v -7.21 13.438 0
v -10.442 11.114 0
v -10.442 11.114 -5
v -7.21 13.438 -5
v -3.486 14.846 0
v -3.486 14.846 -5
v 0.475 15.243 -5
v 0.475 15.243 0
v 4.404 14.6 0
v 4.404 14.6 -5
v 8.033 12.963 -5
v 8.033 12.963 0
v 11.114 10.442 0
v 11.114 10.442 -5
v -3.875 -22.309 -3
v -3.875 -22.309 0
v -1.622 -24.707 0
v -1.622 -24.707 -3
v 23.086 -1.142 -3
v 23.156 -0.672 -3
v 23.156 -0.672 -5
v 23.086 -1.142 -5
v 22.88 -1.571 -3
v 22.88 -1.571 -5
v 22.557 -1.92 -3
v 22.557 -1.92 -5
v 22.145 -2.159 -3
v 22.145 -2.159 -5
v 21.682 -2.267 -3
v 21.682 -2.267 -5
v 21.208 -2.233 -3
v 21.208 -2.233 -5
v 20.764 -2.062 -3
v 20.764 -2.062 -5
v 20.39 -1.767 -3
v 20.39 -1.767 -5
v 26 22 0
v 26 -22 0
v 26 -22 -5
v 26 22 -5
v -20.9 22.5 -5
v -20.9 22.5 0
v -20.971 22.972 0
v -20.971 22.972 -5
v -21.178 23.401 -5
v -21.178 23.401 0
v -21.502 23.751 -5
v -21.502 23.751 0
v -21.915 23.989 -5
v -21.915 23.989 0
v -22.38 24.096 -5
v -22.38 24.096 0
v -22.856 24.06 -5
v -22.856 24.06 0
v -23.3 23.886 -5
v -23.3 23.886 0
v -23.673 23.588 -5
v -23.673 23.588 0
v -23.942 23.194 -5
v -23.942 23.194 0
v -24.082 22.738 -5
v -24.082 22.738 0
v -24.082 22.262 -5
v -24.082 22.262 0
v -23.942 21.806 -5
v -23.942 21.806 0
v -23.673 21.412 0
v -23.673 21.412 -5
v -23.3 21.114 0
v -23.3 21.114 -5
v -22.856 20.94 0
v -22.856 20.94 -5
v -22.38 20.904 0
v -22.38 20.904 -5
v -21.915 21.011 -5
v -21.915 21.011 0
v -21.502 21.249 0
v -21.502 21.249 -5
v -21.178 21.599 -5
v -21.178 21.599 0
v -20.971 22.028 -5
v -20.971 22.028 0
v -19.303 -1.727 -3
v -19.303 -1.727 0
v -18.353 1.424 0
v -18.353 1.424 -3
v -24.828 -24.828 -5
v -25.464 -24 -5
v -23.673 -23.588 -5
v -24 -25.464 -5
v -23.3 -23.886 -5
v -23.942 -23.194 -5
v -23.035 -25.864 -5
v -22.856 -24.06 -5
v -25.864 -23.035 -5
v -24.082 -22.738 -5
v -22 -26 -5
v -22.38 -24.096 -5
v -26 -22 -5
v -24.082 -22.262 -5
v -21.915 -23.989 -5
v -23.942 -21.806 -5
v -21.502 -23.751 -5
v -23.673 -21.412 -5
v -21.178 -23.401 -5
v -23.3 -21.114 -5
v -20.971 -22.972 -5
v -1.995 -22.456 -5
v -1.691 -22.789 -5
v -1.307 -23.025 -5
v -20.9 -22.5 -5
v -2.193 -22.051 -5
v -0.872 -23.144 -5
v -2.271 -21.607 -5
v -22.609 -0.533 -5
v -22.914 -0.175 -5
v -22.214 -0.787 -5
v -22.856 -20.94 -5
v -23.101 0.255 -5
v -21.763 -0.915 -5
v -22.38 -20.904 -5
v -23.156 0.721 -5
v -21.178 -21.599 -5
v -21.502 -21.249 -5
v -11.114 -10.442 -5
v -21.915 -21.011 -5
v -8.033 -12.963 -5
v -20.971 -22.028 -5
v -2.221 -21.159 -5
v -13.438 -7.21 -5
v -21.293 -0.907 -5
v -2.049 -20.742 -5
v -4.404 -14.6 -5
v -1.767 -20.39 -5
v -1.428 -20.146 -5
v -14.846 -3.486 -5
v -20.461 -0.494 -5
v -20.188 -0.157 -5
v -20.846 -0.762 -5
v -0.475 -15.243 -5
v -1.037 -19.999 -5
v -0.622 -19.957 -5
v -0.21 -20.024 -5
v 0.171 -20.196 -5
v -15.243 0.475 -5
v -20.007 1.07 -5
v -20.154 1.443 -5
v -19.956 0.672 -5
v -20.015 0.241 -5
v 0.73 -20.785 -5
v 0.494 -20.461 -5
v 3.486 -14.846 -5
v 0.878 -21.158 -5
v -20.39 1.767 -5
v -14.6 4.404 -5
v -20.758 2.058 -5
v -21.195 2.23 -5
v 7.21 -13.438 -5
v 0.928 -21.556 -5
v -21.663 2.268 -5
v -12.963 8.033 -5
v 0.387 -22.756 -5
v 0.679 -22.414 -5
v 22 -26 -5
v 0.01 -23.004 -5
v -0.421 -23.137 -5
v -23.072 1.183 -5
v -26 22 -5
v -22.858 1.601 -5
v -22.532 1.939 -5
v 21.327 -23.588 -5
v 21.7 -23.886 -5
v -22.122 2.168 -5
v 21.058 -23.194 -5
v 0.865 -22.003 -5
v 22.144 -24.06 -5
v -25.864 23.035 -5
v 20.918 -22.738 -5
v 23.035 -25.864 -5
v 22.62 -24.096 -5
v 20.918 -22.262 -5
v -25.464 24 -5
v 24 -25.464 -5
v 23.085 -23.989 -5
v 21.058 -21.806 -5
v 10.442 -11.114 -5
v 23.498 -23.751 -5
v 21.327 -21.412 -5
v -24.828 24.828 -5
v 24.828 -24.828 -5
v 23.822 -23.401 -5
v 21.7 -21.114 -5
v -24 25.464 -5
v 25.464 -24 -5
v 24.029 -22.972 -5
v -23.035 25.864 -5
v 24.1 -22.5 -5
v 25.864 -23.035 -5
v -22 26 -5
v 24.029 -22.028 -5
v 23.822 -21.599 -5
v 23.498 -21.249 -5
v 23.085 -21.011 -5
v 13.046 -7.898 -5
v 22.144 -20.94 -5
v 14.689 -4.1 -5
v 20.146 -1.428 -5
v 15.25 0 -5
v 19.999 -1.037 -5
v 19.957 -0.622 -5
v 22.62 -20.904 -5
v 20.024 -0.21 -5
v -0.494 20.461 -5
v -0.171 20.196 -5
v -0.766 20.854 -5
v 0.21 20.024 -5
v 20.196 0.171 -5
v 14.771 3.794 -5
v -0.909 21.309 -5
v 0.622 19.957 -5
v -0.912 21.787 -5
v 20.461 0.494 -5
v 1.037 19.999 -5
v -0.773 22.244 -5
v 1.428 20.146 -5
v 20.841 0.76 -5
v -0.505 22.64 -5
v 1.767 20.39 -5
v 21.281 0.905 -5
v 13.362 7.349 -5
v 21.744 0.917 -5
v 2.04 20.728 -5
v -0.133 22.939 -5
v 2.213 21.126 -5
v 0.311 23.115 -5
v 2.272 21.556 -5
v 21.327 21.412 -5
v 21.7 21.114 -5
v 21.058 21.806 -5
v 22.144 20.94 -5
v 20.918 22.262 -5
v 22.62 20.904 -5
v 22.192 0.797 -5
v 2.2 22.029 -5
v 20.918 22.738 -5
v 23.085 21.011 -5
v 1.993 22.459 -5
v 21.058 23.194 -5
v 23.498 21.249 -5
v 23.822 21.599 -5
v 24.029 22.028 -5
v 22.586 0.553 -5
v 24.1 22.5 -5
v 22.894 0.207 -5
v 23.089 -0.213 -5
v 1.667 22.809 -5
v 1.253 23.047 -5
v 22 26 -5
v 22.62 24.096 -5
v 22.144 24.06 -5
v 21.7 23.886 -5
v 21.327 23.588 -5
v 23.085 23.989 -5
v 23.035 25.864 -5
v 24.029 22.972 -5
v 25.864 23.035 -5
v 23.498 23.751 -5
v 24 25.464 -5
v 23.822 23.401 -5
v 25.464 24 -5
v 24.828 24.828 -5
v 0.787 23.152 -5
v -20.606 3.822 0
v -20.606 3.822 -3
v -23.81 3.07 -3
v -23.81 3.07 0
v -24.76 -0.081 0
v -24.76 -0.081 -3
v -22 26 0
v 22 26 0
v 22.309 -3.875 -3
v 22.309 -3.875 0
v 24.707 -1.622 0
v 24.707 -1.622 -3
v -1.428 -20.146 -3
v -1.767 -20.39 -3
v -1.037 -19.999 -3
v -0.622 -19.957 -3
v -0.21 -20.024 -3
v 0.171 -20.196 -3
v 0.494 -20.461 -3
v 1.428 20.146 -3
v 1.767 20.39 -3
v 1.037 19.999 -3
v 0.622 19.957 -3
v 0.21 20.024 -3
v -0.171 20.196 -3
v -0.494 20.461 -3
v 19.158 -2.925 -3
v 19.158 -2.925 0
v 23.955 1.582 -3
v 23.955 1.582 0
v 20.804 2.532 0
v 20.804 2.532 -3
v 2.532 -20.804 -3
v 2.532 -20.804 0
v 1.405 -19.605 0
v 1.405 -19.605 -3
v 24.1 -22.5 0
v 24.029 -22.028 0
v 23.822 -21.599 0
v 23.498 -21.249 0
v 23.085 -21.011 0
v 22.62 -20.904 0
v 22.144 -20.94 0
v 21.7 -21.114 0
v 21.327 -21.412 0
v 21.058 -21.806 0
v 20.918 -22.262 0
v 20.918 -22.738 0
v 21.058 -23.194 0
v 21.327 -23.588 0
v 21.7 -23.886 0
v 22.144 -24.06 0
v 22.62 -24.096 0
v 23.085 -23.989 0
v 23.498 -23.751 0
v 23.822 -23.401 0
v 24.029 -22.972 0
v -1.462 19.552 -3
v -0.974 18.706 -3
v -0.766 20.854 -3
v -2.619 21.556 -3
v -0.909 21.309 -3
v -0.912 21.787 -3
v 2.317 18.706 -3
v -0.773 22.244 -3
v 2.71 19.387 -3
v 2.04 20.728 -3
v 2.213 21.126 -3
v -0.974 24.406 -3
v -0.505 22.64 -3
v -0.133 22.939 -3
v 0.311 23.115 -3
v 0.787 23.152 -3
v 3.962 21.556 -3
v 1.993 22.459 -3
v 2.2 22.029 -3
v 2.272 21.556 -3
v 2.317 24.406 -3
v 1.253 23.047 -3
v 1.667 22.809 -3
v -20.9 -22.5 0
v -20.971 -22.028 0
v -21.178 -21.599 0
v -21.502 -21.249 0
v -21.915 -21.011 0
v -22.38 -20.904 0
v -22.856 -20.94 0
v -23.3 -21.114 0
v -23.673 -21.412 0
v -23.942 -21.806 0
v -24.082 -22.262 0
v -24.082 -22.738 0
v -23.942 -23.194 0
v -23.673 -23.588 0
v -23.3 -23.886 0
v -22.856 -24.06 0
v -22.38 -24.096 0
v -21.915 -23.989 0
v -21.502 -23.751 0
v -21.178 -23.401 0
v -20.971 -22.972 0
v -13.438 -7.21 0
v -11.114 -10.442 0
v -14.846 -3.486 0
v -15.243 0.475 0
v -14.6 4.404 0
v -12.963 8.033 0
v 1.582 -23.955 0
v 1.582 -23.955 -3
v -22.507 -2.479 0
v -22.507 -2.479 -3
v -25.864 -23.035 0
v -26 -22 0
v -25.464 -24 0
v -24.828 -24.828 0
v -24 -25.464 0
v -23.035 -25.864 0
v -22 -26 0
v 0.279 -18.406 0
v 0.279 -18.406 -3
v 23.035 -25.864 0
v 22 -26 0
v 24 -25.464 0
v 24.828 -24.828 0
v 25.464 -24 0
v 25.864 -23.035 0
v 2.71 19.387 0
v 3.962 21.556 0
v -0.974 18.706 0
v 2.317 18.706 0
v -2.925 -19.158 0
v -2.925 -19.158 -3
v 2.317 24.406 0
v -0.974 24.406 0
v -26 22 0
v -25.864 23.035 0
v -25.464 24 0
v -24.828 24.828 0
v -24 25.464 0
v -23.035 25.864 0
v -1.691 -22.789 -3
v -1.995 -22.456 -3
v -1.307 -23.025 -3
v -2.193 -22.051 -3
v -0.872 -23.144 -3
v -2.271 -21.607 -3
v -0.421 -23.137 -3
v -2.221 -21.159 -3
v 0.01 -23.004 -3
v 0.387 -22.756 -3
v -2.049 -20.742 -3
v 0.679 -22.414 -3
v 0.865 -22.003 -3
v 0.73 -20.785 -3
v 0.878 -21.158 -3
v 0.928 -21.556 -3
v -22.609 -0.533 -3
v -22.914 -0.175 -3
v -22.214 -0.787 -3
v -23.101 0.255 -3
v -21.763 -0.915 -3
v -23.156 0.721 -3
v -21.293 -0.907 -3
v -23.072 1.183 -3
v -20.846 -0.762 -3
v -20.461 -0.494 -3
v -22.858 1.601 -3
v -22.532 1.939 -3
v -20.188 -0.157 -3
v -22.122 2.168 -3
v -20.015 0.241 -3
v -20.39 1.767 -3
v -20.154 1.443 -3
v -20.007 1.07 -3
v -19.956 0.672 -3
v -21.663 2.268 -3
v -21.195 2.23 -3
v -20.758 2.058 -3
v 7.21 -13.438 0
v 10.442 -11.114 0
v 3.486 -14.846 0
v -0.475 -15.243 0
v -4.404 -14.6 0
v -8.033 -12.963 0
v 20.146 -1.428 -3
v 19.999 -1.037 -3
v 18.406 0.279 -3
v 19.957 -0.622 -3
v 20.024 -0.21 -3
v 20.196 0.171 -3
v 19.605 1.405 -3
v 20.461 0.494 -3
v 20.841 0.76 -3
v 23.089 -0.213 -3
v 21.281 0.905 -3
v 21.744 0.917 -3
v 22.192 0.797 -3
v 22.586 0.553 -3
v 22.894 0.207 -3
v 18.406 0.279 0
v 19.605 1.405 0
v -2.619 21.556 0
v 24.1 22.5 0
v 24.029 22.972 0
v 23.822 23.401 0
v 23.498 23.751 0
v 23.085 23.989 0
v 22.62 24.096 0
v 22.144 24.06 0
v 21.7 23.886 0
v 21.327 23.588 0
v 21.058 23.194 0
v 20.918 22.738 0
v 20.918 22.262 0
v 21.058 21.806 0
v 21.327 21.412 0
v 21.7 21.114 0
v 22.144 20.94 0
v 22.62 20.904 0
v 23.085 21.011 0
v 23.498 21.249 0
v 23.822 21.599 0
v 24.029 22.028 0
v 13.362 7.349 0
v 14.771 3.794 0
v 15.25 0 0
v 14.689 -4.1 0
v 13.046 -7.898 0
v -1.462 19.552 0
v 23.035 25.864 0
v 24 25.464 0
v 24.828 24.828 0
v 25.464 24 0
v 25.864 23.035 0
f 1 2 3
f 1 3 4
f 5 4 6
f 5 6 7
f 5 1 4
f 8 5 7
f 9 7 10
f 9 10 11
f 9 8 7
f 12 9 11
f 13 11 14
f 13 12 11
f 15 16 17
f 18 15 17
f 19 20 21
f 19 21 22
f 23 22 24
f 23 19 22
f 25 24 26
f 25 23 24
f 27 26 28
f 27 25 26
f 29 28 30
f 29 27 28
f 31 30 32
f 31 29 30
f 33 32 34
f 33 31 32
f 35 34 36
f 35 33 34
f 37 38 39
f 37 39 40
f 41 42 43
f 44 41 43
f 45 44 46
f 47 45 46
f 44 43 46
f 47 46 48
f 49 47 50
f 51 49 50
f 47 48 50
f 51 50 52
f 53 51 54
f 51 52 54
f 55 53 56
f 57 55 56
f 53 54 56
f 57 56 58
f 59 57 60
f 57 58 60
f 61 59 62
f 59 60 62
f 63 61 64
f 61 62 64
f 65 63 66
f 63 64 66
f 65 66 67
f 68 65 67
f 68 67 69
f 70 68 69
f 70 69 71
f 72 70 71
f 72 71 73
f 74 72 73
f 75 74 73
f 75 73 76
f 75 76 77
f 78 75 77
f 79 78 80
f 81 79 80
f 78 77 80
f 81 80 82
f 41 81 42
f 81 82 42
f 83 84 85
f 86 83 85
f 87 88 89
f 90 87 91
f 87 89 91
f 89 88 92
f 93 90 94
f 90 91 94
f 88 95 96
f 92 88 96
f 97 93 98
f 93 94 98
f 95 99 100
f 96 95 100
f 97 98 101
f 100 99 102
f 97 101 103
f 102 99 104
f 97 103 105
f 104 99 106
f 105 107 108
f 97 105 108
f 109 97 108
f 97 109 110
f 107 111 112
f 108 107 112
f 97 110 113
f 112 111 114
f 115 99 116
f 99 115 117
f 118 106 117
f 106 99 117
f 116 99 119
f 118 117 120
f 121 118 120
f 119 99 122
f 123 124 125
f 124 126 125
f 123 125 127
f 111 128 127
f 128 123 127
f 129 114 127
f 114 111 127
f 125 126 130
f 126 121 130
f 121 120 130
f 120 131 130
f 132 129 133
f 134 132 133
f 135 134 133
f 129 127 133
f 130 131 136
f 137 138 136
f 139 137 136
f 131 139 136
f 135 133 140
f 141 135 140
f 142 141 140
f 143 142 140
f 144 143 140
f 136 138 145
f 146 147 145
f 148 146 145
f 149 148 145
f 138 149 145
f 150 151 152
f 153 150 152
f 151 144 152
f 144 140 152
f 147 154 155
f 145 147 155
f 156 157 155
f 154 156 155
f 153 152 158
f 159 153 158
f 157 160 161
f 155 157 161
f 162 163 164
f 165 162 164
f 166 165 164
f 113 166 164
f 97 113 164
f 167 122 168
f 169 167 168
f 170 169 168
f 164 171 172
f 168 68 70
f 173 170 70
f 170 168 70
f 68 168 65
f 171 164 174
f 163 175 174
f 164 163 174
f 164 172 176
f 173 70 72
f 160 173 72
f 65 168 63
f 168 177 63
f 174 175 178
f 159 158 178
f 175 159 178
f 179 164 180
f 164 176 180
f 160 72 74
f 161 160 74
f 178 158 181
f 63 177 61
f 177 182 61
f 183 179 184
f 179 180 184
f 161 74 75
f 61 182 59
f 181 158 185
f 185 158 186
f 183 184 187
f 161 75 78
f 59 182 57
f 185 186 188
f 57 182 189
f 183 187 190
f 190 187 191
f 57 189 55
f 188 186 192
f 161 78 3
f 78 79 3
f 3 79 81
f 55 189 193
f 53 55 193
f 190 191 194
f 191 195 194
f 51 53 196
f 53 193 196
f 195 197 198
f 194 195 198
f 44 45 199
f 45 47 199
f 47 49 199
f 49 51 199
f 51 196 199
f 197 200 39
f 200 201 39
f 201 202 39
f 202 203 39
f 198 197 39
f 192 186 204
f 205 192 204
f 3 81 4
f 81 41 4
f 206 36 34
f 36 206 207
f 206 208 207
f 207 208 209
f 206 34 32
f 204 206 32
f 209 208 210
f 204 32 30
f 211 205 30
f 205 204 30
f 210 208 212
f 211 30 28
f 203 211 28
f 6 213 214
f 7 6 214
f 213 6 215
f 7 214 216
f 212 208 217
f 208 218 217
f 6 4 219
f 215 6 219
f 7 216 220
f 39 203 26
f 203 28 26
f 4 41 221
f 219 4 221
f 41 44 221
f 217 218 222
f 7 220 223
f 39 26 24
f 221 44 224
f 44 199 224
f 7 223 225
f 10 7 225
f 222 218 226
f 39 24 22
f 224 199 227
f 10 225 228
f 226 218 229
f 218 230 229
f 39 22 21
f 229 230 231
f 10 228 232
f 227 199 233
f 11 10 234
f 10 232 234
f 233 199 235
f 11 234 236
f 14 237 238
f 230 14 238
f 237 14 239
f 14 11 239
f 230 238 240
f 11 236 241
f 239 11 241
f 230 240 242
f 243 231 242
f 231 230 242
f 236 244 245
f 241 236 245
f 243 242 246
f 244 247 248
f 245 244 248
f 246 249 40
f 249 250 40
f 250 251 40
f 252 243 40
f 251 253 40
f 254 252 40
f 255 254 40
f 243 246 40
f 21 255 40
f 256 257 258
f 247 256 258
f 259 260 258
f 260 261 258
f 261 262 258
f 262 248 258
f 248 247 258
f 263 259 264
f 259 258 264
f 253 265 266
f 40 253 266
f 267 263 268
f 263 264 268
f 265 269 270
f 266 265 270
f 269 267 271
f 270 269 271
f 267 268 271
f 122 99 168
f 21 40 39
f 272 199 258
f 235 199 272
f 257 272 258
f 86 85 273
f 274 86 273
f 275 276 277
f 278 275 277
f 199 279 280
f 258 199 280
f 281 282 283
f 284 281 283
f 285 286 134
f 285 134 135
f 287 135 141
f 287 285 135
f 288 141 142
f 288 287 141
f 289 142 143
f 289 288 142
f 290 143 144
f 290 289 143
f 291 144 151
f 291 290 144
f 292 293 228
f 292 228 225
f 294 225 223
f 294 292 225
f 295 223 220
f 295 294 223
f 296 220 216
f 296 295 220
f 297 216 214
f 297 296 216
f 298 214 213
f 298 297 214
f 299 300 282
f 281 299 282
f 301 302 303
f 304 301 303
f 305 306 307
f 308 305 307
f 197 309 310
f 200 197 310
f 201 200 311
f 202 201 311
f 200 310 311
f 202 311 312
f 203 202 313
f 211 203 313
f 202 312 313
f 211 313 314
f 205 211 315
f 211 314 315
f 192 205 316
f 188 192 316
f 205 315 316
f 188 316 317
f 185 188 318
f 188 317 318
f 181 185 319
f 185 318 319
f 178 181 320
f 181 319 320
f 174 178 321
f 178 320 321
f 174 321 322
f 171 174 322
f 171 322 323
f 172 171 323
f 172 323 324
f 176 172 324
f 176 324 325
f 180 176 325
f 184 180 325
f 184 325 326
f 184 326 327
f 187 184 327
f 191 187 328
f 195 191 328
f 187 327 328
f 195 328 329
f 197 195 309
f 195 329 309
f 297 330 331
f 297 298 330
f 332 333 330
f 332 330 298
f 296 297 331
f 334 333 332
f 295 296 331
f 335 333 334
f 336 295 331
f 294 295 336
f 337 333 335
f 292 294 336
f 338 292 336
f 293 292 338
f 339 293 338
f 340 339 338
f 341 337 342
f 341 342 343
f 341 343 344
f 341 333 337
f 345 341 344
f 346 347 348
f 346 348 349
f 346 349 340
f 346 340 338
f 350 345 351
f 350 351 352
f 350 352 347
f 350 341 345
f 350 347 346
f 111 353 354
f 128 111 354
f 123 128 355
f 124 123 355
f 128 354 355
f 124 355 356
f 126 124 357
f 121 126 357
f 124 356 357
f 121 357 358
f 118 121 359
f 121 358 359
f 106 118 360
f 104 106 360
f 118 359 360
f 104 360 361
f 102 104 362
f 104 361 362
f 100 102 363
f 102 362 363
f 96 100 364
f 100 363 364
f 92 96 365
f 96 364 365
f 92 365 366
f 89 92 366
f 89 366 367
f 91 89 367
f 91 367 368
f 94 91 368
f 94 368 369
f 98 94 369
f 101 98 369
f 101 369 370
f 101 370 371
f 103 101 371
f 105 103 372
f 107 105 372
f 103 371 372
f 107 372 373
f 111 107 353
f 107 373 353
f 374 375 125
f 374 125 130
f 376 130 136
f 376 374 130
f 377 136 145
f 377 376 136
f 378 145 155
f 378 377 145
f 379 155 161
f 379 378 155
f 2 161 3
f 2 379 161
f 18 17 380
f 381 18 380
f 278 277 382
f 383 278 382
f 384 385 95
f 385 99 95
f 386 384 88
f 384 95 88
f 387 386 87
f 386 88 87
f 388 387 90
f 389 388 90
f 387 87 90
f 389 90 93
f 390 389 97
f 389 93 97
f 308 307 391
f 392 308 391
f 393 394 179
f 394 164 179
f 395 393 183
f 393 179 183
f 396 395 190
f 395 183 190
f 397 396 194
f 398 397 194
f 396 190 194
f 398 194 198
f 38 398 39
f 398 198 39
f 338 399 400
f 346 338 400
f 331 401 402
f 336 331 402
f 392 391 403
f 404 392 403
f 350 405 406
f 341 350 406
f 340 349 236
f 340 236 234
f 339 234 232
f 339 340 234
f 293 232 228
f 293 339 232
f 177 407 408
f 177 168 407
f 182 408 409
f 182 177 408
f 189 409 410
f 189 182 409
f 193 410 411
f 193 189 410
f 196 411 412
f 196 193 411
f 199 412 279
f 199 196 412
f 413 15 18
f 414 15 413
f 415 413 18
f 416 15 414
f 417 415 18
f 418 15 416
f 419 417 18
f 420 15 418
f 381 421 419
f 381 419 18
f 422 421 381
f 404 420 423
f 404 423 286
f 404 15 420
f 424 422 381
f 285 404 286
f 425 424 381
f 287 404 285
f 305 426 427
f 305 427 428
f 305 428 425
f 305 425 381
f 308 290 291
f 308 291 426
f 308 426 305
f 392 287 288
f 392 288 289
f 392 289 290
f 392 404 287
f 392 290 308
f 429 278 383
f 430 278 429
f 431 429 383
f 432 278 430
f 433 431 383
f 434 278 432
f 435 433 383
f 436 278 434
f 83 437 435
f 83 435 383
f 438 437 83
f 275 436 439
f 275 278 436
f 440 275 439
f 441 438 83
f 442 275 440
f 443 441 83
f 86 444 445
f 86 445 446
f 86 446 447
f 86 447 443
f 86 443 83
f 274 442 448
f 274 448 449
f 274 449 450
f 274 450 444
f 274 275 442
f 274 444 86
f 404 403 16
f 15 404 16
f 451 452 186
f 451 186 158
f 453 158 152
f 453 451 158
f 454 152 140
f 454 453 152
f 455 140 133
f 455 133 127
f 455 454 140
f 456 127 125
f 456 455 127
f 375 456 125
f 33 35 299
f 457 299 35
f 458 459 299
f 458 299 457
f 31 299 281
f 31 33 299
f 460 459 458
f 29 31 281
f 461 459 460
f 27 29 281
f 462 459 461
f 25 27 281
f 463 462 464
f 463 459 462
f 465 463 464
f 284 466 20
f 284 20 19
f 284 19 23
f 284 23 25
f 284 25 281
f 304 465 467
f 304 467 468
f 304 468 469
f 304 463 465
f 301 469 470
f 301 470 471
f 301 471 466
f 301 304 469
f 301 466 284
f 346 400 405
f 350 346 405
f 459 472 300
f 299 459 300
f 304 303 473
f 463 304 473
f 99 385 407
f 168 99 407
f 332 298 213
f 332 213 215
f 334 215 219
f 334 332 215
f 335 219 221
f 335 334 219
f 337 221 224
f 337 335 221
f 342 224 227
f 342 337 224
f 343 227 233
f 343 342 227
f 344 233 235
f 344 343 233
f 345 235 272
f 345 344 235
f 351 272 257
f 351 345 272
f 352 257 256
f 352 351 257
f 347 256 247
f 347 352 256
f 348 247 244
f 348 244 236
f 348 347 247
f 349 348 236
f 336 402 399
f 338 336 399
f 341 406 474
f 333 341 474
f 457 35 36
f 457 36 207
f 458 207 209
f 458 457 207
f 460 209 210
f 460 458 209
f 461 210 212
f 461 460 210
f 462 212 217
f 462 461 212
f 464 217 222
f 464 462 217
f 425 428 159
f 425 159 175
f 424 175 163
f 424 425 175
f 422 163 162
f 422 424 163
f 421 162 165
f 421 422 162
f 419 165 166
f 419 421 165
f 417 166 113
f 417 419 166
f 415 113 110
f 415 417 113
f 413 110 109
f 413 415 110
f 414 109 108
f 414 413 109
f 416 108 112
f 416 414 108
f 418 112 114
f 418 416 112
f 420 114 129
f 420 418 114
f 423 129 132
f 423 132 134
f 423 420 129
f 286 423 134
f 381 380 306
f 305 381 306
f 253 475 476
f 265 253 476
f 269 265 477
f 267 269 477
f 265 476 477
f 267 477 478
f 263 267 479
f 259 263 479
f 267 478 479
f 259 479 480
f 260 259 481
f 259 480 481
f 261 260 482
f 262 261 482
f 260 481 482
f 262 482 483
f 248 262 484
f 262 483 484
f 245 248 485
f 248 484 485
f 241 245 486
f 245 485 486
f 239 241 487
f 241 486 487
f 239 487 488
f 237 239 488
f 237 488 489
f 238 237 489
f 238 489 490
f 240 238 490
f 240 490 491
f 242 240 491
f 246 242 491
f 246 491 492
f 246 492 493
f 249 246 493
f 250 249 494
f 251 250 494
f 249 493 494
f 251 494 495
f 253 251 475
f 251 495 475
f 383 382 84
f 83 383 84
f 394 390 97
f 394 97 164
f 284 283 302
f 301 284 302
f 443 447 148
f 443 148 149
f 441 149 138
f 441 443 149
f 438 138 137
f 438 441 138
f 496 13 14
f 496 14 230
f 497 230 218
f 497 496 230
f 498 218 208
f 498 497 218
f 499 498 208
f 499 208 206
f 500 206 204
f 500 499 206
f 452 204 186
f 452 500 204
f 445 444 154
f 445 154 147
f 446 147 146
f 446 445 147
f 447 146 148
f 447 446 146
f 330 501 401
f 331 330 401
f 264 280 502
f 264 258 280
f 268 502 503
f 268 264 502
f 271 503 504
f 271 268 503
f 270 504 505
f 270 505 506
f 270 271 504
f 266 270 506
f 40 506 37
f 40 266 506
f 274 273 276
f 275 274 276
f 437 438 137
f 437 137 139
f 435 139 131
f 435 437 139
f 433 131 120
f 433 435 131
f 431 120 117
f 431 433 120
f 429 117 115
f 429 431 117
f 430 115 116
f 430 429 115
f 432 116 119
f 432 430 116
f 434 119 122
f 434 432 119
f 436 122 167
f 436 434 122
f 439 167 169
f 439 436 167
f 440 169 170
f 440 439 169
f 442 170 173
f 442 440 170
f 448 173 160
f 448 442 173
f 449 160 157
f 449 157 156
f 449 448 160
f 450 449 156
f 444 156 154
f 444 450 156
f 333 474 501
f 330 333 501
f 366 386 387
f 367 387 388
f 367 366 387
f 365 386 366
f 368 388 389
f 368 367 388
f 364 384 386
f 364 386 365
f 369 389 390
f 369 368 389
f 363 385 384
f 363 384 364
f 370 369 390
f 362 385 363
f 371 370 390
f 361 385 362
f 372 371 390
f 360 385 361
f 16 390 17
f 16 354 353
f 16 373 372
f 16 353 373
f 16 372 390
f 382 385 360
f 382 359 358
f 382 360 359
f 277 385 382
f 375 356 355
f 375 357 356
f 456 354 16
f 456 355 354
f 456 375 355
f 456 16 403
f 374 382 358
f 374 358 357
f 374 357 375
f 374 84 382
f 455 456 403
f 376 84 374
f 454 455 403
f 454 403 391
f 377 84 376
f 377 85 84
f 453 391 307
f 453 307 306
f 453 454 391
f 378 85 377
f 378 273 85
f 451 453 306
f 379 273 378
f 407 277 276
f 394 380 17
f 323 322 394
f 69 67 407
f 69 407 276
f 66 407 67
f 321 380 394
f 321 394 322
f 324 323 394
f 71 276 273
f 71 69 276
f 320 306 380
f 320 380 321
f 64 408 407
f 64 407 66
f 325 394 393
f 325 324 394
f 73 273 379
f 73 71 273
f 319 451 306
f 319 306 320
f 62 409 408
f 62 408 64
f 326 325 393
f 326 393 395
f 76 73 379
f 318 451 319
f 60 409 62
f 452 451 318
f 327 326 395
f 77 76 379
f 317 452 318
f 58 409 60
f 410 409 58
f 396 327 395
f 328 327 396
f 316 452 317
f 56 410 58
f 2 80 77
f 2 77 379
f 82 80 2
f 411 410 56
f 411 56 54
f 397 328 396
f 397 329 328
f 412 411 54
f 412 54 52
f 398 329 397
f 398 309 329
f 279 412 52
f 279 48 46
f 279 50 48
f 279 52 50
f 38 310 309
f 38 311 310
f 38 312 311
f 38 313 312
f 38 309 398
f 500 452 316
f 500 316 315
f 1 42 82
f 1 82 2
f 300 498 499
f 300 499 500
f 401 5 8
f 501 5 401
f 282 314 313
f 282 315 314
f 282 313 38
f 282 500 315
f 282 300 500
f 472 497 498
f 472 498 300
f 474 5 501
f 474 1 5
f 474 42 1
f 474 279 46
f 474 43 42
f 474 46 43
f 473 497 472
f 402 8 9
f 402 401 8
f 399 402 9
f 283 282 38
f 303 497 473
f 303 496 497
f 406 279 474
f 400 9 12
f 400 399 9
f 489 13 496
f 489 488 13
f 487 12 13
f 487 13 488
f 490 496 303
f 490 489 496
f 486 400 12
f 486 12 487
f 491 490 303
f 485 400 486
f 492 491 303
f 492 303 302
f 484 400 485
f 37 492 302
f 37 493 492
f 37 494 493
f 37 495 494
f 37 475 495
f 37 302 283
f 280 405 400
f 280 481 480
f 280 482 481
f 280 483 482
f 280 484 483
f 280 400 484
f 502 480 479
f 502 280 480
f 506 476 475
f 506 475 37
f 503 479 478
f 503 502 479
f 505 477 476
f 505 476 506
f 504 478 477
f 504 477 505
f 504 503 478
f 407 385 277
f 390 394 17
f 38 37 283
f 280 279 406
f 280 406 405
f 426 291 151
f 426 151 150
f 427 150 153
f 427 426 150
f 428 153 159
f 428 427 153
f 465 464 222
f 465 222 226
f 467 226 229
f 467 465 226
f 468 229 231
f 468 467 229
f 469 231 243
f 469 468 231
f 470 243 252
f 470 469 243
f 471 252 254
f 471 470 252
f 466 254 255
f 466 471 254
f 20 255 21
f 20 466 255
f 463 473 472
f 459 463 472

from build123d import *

# Parameters (mm, degrees)
F0_W     = 52
F0_H     = 52
F0_R     = 1.6
F1_DEPTH = 5
F2_DEPTH = 3
F3_R     = 4


# Not quite as in the source:
# - a feature names something its author has since deleted; it is built from what else it names


with BuildPart() as f1:
    # F0 (on Top) → F1 (new body)
    with BuildSketch(Plane.XY):
        Rectangle(F0_W, F0_H)
        with Locations((-22.5, -22.5)):
            Circle(F0_R, mode=Mode.SUBTRACT)
        Polygon((2.709940502, 19.3868434803), (11.1139385238, 10.4423594312), (19.6047750449, 1.4054520414), (20.8039495292, 2.5321643188), (23.9546469235, 1.5818454623), (24.7069953493, -1.6218979491), (22.3086463807, -3.875322504), (19.1579489863, -2.9250036475), (10.4423594312, -11.1139385238), (1.4054520414, -19.6047750449), (2.5321643188, -20.8039495292), (1.5818454623, -23.9546469235), (-1.6218979491, -24.7069953493), (-3.875322504, -22.3086463807), (-2.9250036475, -19.1579489863), (-11.1139385858, -10.4423593652), (-19.3028734, -1.726769876), (-22.5066168114, -2.4791183018), (-24.7600413664, -0.0807693332), (-23.8097225099, 3.0699280612), (-20.6059790985, 3.822276487), (-19.479266821, 2.6231020027), (-10.4423594312, 11.1139385238), (-1.4619546156, 19.5516867371), (-2.6193174418, 21.5562979549), (-0.9738691746, 24.4062979549), (2.3170273598, 24.4062979549), (3.962475627, 21.5562979549), align=None, mode=Mode.SUBTRACT)
        with Locations((22.5, -22.5)):
            Circle(F0_R, mode=Mode.SUBTRACT)
        with Locations((-22.5, 22.5)):
            Circle(F0_R, mode=Mode.SUBTRACT)
        with Locations((22.5, 22.5)):
            Circle(F0_R, mode=Mode.SUBTRACT)
        with BuildLine():
            ThreePointArc((-10.4423594312, 11.1139385238), (0.4748781305, 15.2426044612), (11.1139385238, 10.4423594312))
            Line((11.1139385238, 10.4423594312), (2.709940502, 19.3868434803))
            Line((2.709940502, 19.3868434803), (2.3170273598, 18.7062979549))
            Line((2.3170273598, 18.7062979549), (-0.9738691746, 18.7062979549))
            Line((-0.9738691746, 18.7062979549), (-1.4619546156, 19.5516867371))
            Line((-1.4619546156, 19.5516867371), (-10.4423594312, 11.1139385238))
        make_face()
        with BuildLine():
            ThreePointArc((11.1139385238, 10.4423594312), (14.1783296352, 5.6158230702), (15.25, 0))
            ThreePointArc((15.25, 0), (13.9965796058, -6.054606456), (10.4423594312, -11.1139385238))
            Line((10.4423594312, -11.1139385238), (19.1579489863, -2.9250036475))
            Line((19.1579489863, -2.9250036475), (18.4056005606, 0.2787397639))
            Line((18.4056005606, 0.2787397639), (19.6047750449, 1.4054520414))
            Line((19.6047750449, 1.4054520414), (11.1139385238, 10.4423594312))
        make_face()
        with BuildLine():
            Line((1.4054520414, -19.6047750449), (10.4423594312, -11.1139385238))
            ThreePointArc((10.4423594312, -11.1139385238), (-0.4748781757, -15.2426044598), (-11.1139385858, -10.4423593652))
            Line((-11.1139385858, -10.4423593652), (-2.9250036475, -19.1579489863))
            Line((-2.9250036475, -19.1579489863), (0.2787397639, -18.4056005606))
            Line((0.2787397639, -18.4056005606), (1.4054520414, -19.6047750449))
        make_face()
        with BuildLine():
            ThreePointArc((-11.1139385858, -10.4423593652), (-15.2426044598, 0.4748781757), (-10.4423594312, 11.1139385238))
            Line((-10.4423594312, 11.1139385238), (-19.479266821, 2.6231020027))
            Line((-19.479266821, 2.6231020027), (-18.3525545435, 1.4239275184))
            Line((-18.3525545435, 1.4239275184), (-19.3028734, -1.726769876))
            Line((-19.3028734, -1.726769876), (-11.1139385858, -10.4423593652))
        make_face()
        with BuildLine():
            Line((-18.3525545435, 1.4239275184), (-19.479266821, 2.6231020027))
            Line((-19.479266821, 2.6231020027), (-20.3902453885, 1.7671709018))
            ThreePointArc((-20.3902453885, 1.7671709018), (-20.0687355014, 1.2607802016), (-19.9562979549, 0.6715790926))
            ThreePointArc((-19.9562979549, 0.6715790926), (-20.087804357, 0.0363416939), (-20.4607061458, -0.4944734738))
            Line((-20.4607061458, -0.4944734738), (-19.3028734, -1.726769876))
            Line((-19.3028734, -1.726769876), (-18.3525545435, 1.4239275184))
        make_face()
        with BuildLine():
            Line((-20.3902453885, 1.7671709018), (-19.479266821, 2.6231020027))
            Line((-19.479266821, 2.6231020027), (-20.6059790985, 3.822276487))
            Line((-20.6059790985, 3.822276487), (-23.8097225099, 3.0699280612))
            Line((-23.8097225099, 3.0699280612), (-24.7600413664, -0.0807693332))
            Line((-24.7600413664, -0.0807693332), (-22.5066168114, -2.4791183018))
            Line((-22.5066168114, -2.4791183018), (-19.3028734, -1.726769876))
            Line((-19.3028734, -1.726769876), (-20.4607061458, -0.4944734738))
            ThreePointArc((-20.4607061458, -0.4944734738), (-23.1555220296, 0.7214023719), (-20.3902453885, 1.7671709018))
        make_face()
        with BuildLine():
            Line((1.7671709018, 20.3902453885), (2.709940502, 19.3868434803))
            Line((2.709940502, 19.3868434803), (3.962475627, 21.5562979549))
            Line((3.962475627, 21.5562979549), (2.3170273598, 24.4062979549))
            Line((2.3170273598, 24.4062979549), (-0.9738691746, 24.4062979549))
            Line((-0.9738691746, 24.4062979549), (-2.6193174418, 21.5562979549))
            Line((-2.6193174418, 21.5562979549), (-1.4619546156, 19.5516867371))
            Line((-1.4619546156, 19.5516867371), (-0.4944734738, 20.4607061458))
            ThreePointArc((-0.4944734738, 20.4607061458), (0.0823779836, 23.0438604085), (2.2715790926, 21.5562979549))
            ThreePointArc((2.2715790926, 21.5562979549), (2.1400726906, 20.9210605563), (1.7671709018, 20.3902453885))
        make_face()
        with BuildLine():
            Line((2.3170273598, 18.7062979549), (2.709940502, 19.3868434803))
            Line((2.709940502, 19.3868434803), (1.7671709018, 20.3902453885))
            ThreePointArc((1.7671709018, 20.3902453885), (0.6217558133, 19.9570738803), (-0.4944734738, 20.4607061458))
            Line((-0.4944734738, 20.4607061458), (-1.4619546156, 19.5516867371))
            Line((-1.4619546156, 19.5516867371), (-0.9738691746, 18.7062979549))
            Line((-0.9738691746, 18.7062979549), (2.3170273598, 18.7062979549))
        make_face()
        with BuildLine():
            Line((20.4607061458, 0.4944734738), (19.6047750449, 1.4054520414))
            Line((19.6047750449, 1.4054520414), (18.4056005606, 0.2787397639))
            Line((18.4056005606, 0.2787397639), (19.1579489863, -2.9250036475))
            Line((19.1579489863, -2.9250036475), (20.3902453885, -1.7671709018))
            ThreePointArc((20.3902453885, -1.7671709018), (19.9570738803, -0.6217558133), (20.4607061458, 0.4944734738))
        make_face()
        with BuildLine():
            Line((20.8039495292, 2.5321643188), (19.6047750449, 1.4054520414))
            Line((19.6047750449, 1.4054520414), (20.4607061458, 0.4944734738))
            ThreePointArc((20.4607061458, 0.4944734738), (22.1915353536, 0.7969145054), (23.1562979549, -0.6715790926))
            ThreePointArc((23.1562979549, -0.6715790926), (22.145499064, -2.1591415461), (20.3902453885, -1.7671709018))
            Line((20.3902453885, -1.7671709018), (19.1579489863, -2.9250036475))
            Line((19.1579489863, -2.9250036475), (22.3086463807, -3.875322504))
            Line((22.3086463807, -3.875322504), (24.7069953493, -1.6218979491))
            Line((24.7069953493, -1.6218979491), (23.9546469235, 1.5818454623))
            Line((23.9546469235, 1.5818454623), (20.8039495292, 2.5321643188))
        make_face()
        with BuildLine():
            Line((2.5321643188, -20.8039495292), (1.4054520414, -19.6047750449))
            Line((1.4054520414, -19.6047750449), (0.4944734738, -20.4607061458))
            ThreePointArc((0.4944734738, -20.4607061458), (0.8159833609, -20.9670968459), (0.9284209074, -21.5562979549))
            ThreePointArc((0.9284209074, -21.5562979549), (-1.3068164913, -23.0247915529), (-1.7671709018, -20.3902453885))
            Line((-1.7671709018, -20.3902453885), (-2.9250036475, -19.1579489863))
            Line((-2.9250036475, -19.1579489863), (-3.875322504, -22.3086463807))
            Line((-3.875322504, -22.3086463807), (-1.6218979491, -24.7069953493))
            Line((-1.6218979491, -24.7069953493), (1.5818454623, -23.9546469235))
            Line((1.5818454623, -23.9546469235), (2.5321643188, -20.8039495292))
        make_face()
        with BuildLine():
            Line((0.4944734738, -20.4607061458), (1.4054520414, -19.6047750449))
            Line((1.4054520414, -19.6047750449), (0.2787397639, -18.4056005606))
            Line((0.2787397639, -18.4056005606), (-2.9250036475, -19.1579489863))
            Line((-2.9250036475, -19.1579489863), (-1.7671709018, -20.3902453885))
            ThreePointArc((-1.7671709018, -20.3902453885), (-0.6217558133, -19.9570738803), (0.4944734738, -20.4607061458))
        make_face()
    extrude(amount=-F1_DEPTH)

    # F0 (on Top) → F2 (cut)
    with BuildSketch(Plane.XY):
        with BuildLine():
            Line((-20.3902453885, 1.7671709018), (-19.479266821, 2.6231020027))
            Line((-19.479266821, 2.6231020027), (-20.6059790985, 3.822276487))
            Line((-20.6059790985, 3.822276487), (-23.8097225099, 3.0699280612))
            Line((-23.8097225099, 3.0699280612), (-24.7600413664, -0.0807693332))
            Line((-24.7600413664, -0.0807693332), (-22.5066168114, -2.4791183018))
            Line((-22.5066168114, -2.4791183018), (-19.3028734, -1.726769876))
            Line((-19.3028734, -1.726769876), (-20.4607061458, -0.4944734738))
            ThreePointArc((-20.4607061458, -0.4944734738), (-23.1555220296, 0.7214023719), (-20.3902453885, 1.7671709018))
        make_face()
        with BuildLine():
            Line((-18.3525545435, 1.4239275184), (-19.479266821, 2.6231020027))
            Line((-19.479266821, 2.6231020027), (-20.3902453885, 1.7671709018))
            ThreePointArc((-20.3902453885, 1.7671709018), (-20.0687355014, 1.2607802016), (-19.9562979549, 0.6715790926))
            ThreePointArc((-19.9562979549, 0.6715790926), (-20.087804357, 0.0363416939), (-20.4607061458, -0.4944734738))
            Line((-20.4607061458, -0.4944734738), (-19.3028734, -1.726769876))
            Line((-19.3028734, -1.726769876), (-18.3525545435, 1.4239275184))
        make_face()
        with BuildLine():
            Line((2.3170273598, 18.7062979549), (2.709940502, 19.3868434803))
            Line((2.709940502, 19.3868434803), (1.7671709018, 20.3902453885))
            ThreePointArc((1.7671709018, 20.3902453885), (0.6217558133, 19.9570738803), (-0.4944734738, 20.4607061458))
            Line((-0.4944734738, 20.4607061458), (-1.4619546156, 19.5516867371))
            Line((-1.4619546156, 19.5516867371), (-0.9738691746, 18.7062979549))
            Line((-0.9738691746, 18.7062979549), (2.3170273598, 18.7062979549))
        make_face()
        with BuildLine():
            Line((1.7671709018, 20.3902453885), (2.709940502, 19.3868434803))
            Line((2.709940502, 19.3868434803), (3.962475627, 21.5562979549))
            Line((3.962475627, 21.5562979549), (2.3170273598, 24.4062979549))
            Line((2.3170273598, 24.4062979549), (-0.9738691746, 24.4062979549))
            Line((-0.9738691746, 24.4062979549), (-2.6193174418, 21.5562979549))
            Line((-2.6193174418, 21.5562979549), (-1.4619546156, 19.5516867371))
            Line((-1.4619546156, 19.5516867371), (-0.4944734738, 20.4607061458))
            ThreePointArc((-0.4944734738, 20.4607061458), (0.0823779836, 23.0438604085), (2.2715790926, 21.5562979549))
            ThreePointArc((2.2715790926, 21.5562979549), (2.1400726906, 20.9210605563), (1.7671709018, 20.3902453885))
        make_face()
        with BuildLine():
            Line((20.4607061458, 0.4944734738), (19.6047750449, 1.4054520414))
            Line((19.6047750449, 1.4054520414), (18.4056005606, 0.2787397639))
            Line((18.4056005606, 0.2787397639), (19.1579489863, -2.9250036475))
            Line((19.1579489863, -2.9250036475), (20.3902453885, -1.7671709018))
            ThreePointArc((20.3902453885, -1.7671709018), (19.9570738803, -0.6217558133), (20.4607061458, 0.4944734738))
        make_face()
        with BuildLine():
            Line((20.8039495292, 2.5321643188), (19.6047750449, 1.4054520414))
            Line((19.6047750449, 1.4054520414), (20.4607061458, 0.4944734738))
            ThreePointArc((20.4607061458, 0.4944734738), (22.1915353536, 0.7969145054), (23.1562979549, -0.6715790926))
            ThreePointArc((23.1562979549, -0.6715790926), (22.145499064, -2.1591415461), (20.3902453885, -1.7671709018))
            Line((20.3902453885, -1.7671709018), (19.1579489863, -2.9250036475))
            Line((19.1579489863, -2.9250036475), (22.3086463807, -3.875322504))
            Line((22.3086463807, -3.875322504), (24.7069953493, -1.6218979491))
            Line((24.7069953493, -1.6218979491), (23.9546469235, 1.5818454623))
            Line((23.9546469235, 1.5818454623), (20.8039495292, 2.5321643188))
        make_face()
        with BuildLine():
            Line((0.4944734738, -20.4607061458), (1.4054520414, -19.6047750449))
            Line((1.4054520414, -19.6047750449), (0.2787397639, -18.4056005606))
            Line((0.2787397639, -18.4056005606), (-2.9250036475, -19.1579489863))
            Line((-2.9250036475, -19.1579489863), (-1.7671709018, -20.3902453885))
            ThreePointArc((-1.7671709018, -20.3902453885), (-0.6217558133, -19.9570738803), (0.4944734738, -20.4607061458))
        make_face()
        with BuildLine():
            Line((2.5321643188, -20.8039495292), (1.4054520414, -19.6047750449))
            Line((1.4054520414, -19.6047750449), (0.4944734738, -20.4607061458))
            ThreePointArc((0.4944734738, -20.4607061458), (0.8159833609, -20.9670968459), (0.9284209074, -21.5562979549))
            ThreePointArc((0.9284209074, -21.5562979549), (-1.3068164913, -23.0247915529), (-1.7671709018, -20.3902453885))
            Line((-1.7671709018, -20.3902453885), (-2.9250036475, -19.1579489863))
            Line((-2.9250036475, -19.1579489863), (-3.875322504, -22.3086463807))
            Line((-3.875322504, -22.3086463807), (-1.6218979491, -24.7069953493))
            Line((-1.6218979491, -24.7069953493), (1.5818454623, -23.9546469235))
            Line((1.5818454623, -23.9546469235), (2.5321643188, -20.8039495292))
        make_face()
    extrude(amount=-F2_DEPTH, mode=Mode.SUBTRACT)

    # F3
    f3_edges = [f1.edges().sort_by_distance(p)[0] for p in [
        (-26, -26, -2.5),
        (26, -26, -2.5),
        (-26, 26, -2.5),
        (26, 26, -2.5),
    ]]
    fillet(f3_edges, radius=F3_R)


solid = f1.part
